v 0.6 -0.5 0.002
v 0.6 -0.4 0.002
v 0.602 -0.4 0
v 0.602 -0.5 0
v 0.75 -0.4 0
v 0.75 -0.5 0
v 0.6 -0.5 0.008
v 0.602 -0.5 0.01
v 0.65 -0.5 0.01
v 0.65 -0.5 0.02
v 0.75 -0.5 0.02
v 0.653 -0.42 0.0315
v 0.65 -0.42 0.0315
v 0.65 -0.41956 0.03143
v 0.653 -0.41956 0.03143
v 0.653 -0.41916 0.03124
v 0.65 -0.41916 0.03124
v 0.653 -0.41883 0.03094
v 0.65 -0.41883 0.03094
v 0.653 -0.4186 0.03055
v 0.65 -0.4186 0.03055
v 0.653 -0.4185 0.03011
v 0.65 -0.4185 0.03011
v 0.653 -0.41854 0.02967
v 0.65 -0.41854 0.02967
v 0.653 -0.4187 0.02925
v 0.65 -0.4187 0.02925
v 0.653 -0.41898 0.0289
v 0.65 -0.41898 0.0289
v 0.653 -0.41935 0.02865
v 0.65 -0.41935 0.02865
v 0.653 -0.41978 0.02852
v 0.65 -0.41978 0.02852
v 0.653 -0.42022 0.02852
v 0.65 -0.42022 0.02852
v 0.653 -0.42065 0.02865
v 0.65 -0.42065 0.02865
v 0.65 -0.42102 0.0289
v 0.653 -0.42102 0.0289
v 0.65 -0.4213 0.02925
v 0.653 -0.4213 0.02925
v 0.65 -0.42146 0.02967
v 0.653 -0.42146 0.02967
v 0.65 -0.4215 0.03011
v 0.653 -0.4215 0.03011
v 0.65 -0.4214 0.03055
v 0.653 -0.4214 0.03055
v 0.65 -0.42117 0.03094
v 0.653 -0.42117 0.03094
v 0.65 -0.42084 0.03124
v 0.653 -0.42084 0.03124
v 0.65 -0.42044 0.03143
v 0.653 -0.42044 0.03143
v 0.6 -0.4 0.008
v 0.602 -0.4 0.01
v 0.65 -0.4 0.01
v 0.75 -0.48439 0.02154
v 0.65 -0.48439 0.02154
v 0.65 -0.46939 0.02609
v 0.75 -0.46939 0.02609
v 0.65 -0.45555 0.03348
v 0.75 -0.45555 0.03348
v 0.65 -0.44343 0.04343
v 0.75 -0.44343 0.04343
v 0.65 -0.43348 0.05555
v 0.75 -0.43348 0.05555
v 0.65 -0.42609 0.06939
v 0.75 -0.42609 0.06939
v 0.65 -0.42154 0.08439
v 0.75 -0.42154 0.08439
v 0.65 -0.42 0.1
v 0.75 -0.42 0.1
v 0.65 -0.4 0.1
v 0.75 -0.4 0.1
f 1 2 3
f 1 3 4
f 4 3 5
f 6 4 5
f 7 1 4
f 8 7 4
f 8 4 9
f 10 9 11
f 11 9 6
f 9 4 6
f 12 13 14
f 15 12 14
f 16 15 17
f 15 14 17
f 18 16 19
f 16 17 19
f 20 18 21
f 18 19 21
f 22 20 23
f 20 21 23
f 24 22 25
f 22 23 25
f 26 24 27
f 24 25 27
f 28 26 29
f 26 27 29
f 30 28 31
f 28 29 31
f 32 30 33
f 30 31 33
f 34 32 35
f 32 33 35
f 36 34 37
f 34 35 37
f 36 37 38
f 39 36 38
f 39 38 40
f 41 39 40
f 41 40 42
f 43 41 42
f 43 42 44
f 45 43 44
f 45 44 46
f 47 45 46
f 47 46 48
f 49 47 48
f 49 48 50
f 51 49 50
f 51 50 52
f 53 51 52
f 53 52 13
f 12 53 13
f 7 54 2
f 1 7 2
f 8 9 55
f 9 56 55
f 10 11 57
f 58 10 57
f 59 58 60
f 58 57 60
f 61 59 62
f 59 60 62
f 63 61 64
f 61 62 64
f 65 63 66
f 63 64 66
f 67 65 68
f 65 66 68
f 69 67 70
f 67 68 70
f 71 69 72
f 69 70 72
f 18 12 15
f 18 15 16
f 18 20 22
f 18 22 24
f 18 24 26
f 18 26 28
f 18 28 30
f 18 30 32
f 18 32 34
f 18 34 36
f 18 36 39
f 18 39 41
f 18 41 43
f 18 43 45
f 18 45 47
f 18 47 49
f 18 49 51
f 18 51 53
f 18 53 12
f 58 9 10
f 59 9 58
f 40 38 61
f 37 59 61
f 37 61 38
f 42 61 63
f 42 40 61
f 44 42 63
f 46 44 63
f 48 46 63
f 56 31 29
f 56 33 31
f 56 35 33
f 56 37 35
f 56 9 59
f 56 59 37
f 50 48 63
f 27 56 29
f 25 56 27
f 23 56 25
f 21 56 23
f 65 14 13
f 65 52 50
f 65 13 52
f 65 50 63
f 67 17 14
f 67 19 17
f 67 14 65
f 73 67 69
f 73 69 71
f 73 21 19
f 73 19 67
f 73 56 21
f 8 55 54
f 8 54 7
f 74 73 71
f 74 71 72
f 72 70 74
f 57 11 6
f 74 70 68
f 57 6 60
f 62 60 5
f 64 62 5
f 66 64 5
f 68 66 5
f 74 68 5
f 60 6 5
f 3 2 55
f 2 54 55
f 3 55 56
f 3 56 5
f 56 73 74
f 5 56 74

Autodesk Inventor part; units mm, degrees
ref_plane "YZ Plane" through (0, 0, 0) normal (1, 0, 0) x (0, 1, 0)
ref_plane "XZ Plane" through (0, 0, 0) normal (0, 1, 0) x (-1, 0, 0)
sketch "스케치1" plane through (0, 0, 0) normal (0, 0, 1) x (1, 0, 0)
  line L0 (-0.15, 0) -> (0.9, 0) construction
  line L1 (0, -0.7) -> (0, 0.7) construction
  line L2 (0.25, -0.5) -> (0.75, -0.5)
  line L3 (0.75, -0.5) -> (0.75, 0.5)
  line L4 (0.75, 0.5) -> (0.25, 0.5)
  line L5 (0.25, 0.5) -> (0.25, -0.5)
  point P0 (0, 0)
  point P1 (0.5, -0.5)
  dimension "d7" = 0.5
  dimension "d8" = 1
  dimension "d9" = 0.25
extrude "돌출1" add sketch "스케치1" along normal blind 0.1
sketch "스케치3" plane through (0.25, 0.5, 0) normal (0, 1, 0) x (1, 0, 0)
  line L0 (-0.25, 0.7571) -> (-0.25, -0.2929) construction
  line L1 (-0.4, 0) -> (0.65, 0) construction
  line L2 (0.5, 0) -> (0, 0) projected
  line L3 (0, 0) -> (0, -0.1) projected
  line L4 (0.5, -0.1) -> (0, -0.1) projected
  line L5 (0.5, 0) -> (0.5, -0.1) projected
  arc A0 (0, -0.1) -> (0.5, -0.1) centre (0.25, 0.6071) ccw
  line L6 (0.25, -0.1) -> (0.25, 0.4799) construction
  point P0 (-0.25, 0)
  dimension "d10" = 0.75
sketch "스케치5" plane through (0, 0, 0.1) normal (0, 0, 1) x (1, 0, 0)
  line L0 (0.75, -0.5) -> (0.75, 0.5) projected
  line L1 (0.75, 0.5) -> (0.25, 0.5) projected
  line L2 (0.25, 0.5) -> (0.25, -0.5) projected
  line L3 (0.25, -0.5) -> (0.75, -0.5) projected
  line L4 (-0.15, 0) -> (0.9, 0) construction
  line L5 (0, -0.7) -> (0, 0.7) construction
  line L6 (-0.15, 0) -> (0.9, 0) construction
  line L7 (0, 0.7) -> (0, -0.7) construction
  line L8 (0.75, 0.4) -> (0.25, 0.4)
  line L9 (0.75, -0.4) -> (0.25, -0.4)
  point P0 (0, 0)
  dimension "d18" = 1
  dimension "d19" = 0.4
sketch "스케치6" plane through (0.75, -0.5, 0) normal (1, 0, 0) x (0, 0, -1)
  line L0 (0, 0) -> (0, 1) projected
  line L1 (0, 1) -> (-0.1, 1) projected
  line L2 (-0.1, 0) -> (-0.1, 1) projected
  line L3 (0, 0) -> (-0.1, 0) projected
  line L4 (0, 0.5) -> (-0.1, 0.5) construction
  line L5 (0, 0.92) -> (-0.1, 0.92)
  arc A0 (-0.1, 0.92) -> (-0.02, 1) centre (-0.1, 1) ccw
  arc A1 (-0.02, 0) -> (-0.1, 0.08) centre (-0.1, 0) ccw
  point P0 (-0.05, 0.5)
  point P1 (-0.05, 0.92)
  point P2 (-0.02, 0)
  point P3 (-0.1, 0.08)
  dimension "d20" = 0.42
extrude "돌출5" cut sketch "스케치6" against normal up to surface (0.5 mm away) contours L3 L2 A1 | L2 L1 A0
sketch "스케치7" plane through (0.75, -0.5, 0) normal (1, 0, 0) x (0, 0, -1)
  arc A0 (-0.1, 0.92) -> (-0.02, 1) centre (-0.1, 1) ccw projected
  line L0 (-0.1, 0.08) -> (-0.1, 0.92) projected
  arc A1 (-0.02, 0) -> (-0.1, 0.08) centre (-0.1, 0) ccw projected
  line L1 (0, 0) -> (-0.02, 0) projected
  line L2 (0, 0) -> (0, 1) projected
  line L3 (0, 1) -> (-0.02, 1) projected
  line L4 (0, 0.5) -> (-0.2526, 0.5) construction
  line L5 (-0.2526, 0.5) -> (-0.2526, 0.9) construction
  line L6 (-0.2526, 0.9) -> (-0.1, 0.9) construction
  line L7 (-0.2526, 0.1) -> (-0.1, 0.1) construction
  dimension "d23" = 0.4
ref_plane "작업 평면1" through (0.25, -0.4, 0) normal (0, -1, 0) x (1, 0, 0)
sketch "스케치8" plane through (0.25, -0.4, 0) normal (0, -1, 0) x (1, 0, 0)
  line L0 (0, 0.02) -> (0, 0.1) projected
  line L1 (0.5, 0.02) -> (0, 0.02) projected
  line L2 (0.5, 0.1) -> (0.5, 0.02) projected
  line L3 (0, 0.1) -> (0.5, 0.1) projected
  line L4 (0.5, 0.02) -> (0, 0.02) projected
  line L5 (0, 0) -> (0, 0.02) projected
  line L6 (0, 0) -> (0.5, 0) projected
  line L7 (0.5, 0) -> (0.5, 0.02) projected
  point P0 (-0.25, 0)
  point P1 (0.5, 0.02)
  point P2 (0, 0.02)
extrude "돌출6" cut sketch "스케치8" against normal blind 10
sketch "스케치9" plane through (0.25, -0.4, 0) normal (0, 1, 0) x (1, 0, 0)
  line L0 (0.5, 0) -> (0.5, -0.1) projected
  line L1 (0, 0) -> (0.5, 0) projected
  line L2 (0, -0.1) -> (0, 0) projected
  line L3 (0.5, -0.1) -> (0, -0.1) projected
  line L4 (0, 0) -> (0.5, 0) construction
  line L5 (0.2, 0) -> (0.2, -0.1) construction
  line L6 (0.2, -0.1) -> (0.2, -0.0922)
  line L7 (0.2, -0.01) -> (0.15, -0.01)
  line L8 (0.15, -0.01) -> (0.15, 0)
  line L9 (0.4, 0) -> (0.4, -0.1) construction
  line L10 (0.5, -0.1) -> (0, -0.1) construction
  line L11 (0.4, -0.01) -> (0.35, -0.01)
  line L12 (0.35, -0.01) -> (0.35, 0)
  line L13 (0.4, -0.01) -> (0.4, -0.1)
  line L14 (0.2, -0.01) -> (0.2, -0.1)
  point P0 (-0.25, 0)
  point P1 (0, -0.05)
  dimension "d27" = 0.2
  dimension "d28" = 0.01
  dimension "d29" = 0.2
  dimension "d30" = 0.05
  dimension "d31" = 0.05
extrude "돌출7" cut sketch "스케치9" against normal blind 10 contours L12 L11 L13 L3 L6 L14 L7 L8 L1 | L8 L7 L14 L6 L3 L2 L1
chamfer "모따기1" distance 0.002 angle 45 2 edges at (0.6, -0.45, 0) (0.6, -0.45, 0.01)
sketch "스케치10" plane through (0.65, -0.4, 0.01) normal (-1, 0, 0) x (0, 0, 1)
  line L0 (0.01, -0.1) -> (0, -0.1) projected
  arc A0 (0.09, -0.02) -> (0.01, -0.1) centre (0.09, -0.1) ccw projected
  line L1 (0.09, 0) -> (0.09, -0.02) projected
  line L2 (0, 0) -> (0.09, 0) projected
  line L3 (0, 0) -> (0, -0.1) projected
  line L4 (0, -0.02) -> (0.02, -0.02) construction
  line L5 (0.02, -0.02) -> (0.02, 0) construction
  circle A1 centre (0.02, -0.02) radius 0.0015
  point P0 (-0.01, 0.4)
  dimension "d37" = 0.02
  dimension "d38" = 0.02
  dimension "d39" = 0.003
extrude "돌출8" cut sketch "스케치10" against normal blind 0.003 contours A1
properties part number "flat_surface_1"
